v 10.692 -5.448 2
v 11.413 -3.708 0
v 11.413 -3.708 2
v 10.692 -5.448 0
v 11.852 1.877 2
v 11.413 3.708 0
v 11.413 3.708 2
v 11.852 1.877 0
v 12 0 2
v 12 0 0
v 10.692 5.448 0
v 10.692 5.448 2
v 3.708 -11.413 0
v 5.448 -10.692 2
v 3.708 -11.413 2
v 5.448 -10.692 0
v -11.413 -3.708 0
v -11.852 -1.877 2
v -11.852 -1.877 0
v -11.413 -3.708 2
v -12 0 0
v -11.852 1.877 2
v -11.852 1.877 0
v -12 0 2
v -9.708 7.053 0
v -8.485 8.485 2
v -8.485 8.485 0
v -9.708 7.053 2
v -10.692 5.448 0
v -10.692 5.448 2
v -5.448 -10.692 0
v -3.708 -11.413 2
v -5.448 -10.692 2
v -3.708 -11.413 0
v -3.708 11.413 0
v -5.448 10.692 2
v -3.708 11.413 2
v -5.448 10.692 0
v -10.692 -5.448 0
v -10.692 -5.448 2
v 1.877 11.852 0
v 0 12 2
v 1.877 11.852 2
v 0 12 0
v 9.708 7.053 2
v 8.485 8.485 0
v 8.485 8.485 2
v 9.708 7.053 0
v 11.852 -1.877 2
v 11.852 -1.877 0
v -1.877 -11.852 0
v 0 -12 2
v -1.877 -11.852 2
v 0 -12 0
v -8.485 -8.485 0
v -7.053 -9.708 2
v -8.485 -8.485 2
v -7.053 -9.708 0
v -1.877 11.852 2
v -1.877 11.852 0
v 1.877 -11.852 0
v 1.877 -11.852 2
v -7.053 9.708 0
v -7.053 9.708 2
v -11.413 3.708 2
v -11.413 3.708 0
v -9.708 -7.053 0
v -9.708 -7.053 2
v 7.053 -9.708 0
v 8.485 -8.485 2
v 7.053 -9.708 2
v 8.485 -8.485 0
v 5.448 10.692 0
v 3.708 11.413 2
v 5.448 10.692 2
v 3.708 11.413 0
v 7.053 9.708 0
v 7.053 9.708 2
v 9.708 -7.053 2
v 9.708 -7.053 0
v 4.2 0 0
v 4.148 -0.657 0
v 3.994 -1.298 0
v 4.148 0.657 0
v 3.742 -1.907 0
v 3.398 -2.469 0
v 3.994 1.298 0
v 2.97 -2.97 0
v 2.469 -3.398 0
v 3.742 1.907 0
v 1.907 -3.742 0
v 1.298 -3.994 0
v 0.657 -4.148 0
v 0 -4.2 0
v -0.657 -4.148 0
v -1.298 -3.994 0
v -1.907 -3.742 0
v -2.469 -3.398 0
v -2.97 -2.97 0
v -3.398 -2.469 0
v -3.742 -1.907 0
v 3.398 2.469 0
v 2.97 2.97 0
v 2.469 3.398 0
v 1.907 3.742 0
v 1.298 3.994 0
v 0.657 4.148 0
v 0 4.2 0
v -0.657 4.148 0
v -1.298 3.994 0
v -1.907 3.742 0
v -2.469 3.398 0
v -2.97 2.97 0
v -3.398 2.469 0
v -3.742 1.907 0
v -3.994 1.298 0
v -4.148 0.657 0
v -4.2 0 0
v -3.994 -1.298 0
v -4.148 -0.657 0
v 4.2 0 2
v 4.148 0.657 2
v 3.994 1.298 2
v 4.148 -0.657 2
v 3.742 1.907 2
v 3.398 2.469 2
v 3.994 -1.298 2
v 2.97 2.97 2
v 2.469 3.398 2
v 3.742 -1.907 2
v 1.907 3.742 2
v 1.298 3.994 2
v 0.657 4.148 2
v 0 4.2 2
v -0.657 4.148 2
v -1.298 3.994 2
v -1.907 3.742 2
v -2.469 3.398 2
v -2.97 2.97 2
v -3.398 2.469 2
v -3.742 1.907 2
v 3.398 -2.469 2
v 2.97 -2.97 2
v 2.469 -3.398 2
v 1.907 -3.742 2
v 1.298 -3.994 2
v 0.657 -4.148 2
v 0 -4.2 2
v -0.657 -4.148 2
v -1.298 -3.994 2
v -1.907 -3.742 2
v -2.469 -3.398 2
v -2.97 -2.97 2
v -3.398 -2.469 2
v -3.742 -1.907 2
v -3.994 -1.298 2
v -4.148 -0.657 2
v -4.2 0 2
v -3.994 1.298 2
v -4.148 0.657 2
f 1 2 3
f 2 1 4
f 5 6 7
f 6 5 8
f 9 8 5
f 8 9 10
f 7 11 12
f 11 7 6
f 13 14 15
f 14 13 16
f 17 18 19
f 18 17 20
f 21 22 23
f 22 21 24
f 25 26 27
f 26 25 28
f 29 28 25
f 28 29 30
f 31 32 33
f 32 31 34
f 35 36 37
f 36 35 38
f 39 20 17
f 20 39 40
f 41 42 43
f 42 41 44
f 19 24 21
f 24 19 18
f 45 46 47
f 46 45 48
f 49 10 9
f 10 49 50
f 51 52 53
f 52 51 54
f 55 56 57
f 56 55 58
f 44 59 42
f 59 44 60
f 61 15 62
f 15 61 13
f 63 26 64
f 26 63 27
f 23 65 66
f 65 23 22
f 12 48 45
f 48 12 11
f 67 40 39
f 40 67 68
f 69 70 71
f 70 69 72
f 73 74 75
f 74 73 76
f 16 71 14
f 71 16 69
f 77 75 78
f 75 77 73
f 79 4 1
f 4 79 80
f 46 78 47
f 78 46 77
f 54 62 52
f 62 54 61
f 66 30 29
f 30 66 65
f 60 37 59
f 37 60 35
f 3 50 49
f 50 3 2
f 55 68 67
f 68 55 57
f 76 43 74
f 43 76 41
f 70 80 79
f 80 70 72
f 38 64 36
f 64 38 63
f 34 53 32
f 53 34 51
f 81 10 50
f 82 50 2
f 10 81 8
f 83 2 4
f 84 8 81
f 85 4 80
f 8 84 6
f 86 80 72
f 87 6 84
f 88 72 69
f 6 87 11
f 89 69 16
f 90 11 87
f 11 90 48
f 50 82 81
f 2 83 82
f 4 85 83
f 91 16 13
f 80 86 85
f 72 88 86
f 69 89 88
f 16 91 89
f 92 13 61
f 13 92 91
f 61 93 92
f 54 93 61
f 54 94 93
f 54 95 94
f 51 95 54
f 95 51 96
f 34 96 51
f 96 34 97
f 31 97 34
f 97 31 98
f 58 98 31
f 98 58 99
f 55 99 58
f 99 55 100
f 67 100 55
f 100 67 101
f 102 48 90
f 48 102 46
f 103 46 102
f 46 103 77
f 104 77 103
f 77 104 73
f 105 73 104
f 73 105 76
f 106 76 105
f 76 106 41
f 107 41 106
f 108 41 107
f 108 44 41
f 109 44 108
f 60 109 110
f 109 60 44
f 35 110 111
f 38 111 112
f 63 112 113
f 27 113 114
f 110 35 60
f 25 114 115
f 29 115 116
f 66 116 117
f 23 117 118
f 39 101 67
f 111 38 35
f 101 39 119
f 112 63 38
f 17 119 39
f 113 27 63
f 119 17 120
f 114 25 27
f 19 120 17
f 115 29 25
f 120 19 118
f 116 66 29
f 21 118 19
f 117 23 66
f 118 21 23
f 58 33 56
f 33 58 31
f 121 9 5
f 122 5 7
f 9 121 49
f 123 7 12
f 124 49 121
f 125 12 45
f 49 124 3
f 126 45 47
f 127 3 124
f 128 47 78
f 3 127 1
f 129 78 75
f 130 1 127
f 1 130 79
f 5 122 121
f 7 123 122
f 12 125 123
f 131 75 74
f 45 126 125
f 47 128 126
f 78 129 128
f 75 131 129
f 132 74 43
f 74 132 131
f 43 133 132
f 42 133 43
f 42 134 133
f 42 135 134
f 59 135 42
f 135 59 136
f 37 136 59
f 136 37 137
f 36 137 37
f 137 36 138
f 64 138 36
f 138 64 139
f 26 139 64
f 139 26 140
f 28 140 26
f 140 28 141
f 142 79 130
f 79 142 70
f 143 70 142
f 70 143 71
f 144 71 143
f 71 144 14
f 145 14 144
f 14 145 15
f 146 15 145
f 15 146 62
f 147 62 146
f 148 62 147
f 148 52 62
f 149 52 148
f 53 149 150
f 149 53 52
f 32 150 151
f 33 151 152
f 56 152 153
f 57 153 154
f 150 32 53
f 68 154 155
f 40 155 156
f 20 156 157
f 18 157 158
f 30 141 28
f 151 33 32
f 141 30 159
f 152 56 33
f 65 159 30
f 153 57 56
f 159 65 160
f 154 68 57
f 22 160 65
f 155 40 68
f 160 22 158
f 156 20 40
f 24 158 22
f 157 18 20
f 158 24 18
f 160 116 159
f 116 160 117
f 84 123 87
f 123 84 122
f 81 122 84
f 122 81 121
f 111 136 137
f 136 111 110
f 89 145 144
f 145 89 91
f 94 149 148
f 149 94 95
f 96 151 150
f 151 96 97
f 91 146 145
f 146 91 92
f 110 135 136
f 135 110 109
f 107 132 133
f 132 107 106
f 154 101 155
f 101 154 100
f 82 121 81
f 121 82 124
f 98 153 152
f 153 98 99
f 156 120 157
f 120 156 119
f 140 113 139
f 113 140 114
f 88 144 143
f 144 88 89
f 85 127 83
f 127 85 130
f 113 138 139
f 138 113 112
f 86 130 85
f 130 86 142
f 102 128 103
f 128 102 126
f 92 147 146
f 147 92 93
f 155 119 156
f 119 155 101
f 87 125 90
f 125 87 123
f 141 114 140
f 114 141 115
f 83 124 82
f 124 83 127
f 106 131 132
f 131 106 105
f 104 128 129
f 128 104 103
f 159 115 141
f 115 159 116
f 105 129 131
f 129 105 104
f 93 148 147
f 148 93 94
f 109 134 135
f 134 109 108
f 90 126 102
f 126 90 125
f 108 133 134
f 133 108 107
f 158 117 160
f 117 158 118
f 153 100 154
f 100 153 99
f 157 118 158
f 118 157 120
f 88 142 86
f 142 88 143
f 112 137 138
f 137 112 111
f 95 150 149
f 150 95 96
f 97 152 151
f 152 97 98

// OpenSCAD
/*
PODKŁADKA DIN 9021

*/

$fn = 40;


        
DIN9021(8);
module DIN9021(gwint)
{
    //Parametry
        //
        function d1(gwint) = lookup(gwint, [[3,3.2],[4,4.3],[5,5.3],[6,6.4],[7,7.4],[8,8.4],[10,10.5],[12,13],[14,15],[16,17],[18,20],[20,22]]);
        d1=d1(gwint);
        //
        function h(gwint) = lookup(gwint, [[3,0.8],[4,1],[5,1.2],[6,1.6],[7,2],[8,2],[10,2.5],[12,3],[14,3],[16,3],[18,4],[20,4]]);
        h=h(gwint);
        //
        function d2(gwint) = lookup(gwint, [[3,9],[4,12],[5,15],[6,18],[7,22],[8,24],[10,30],[12,37],[14,44],[16,50],[18,56],[20,60]]);
        d2=d2(gwint);
    
    steel = [0.8, 0.8, 0.9];
    color(steel,1)
    difference()
    {
    cylinder(h=h, d=d2, center=false);
    translate([0,0,-1])
    cylinder(h=h+2, d=d1, center=false);
    }
}
